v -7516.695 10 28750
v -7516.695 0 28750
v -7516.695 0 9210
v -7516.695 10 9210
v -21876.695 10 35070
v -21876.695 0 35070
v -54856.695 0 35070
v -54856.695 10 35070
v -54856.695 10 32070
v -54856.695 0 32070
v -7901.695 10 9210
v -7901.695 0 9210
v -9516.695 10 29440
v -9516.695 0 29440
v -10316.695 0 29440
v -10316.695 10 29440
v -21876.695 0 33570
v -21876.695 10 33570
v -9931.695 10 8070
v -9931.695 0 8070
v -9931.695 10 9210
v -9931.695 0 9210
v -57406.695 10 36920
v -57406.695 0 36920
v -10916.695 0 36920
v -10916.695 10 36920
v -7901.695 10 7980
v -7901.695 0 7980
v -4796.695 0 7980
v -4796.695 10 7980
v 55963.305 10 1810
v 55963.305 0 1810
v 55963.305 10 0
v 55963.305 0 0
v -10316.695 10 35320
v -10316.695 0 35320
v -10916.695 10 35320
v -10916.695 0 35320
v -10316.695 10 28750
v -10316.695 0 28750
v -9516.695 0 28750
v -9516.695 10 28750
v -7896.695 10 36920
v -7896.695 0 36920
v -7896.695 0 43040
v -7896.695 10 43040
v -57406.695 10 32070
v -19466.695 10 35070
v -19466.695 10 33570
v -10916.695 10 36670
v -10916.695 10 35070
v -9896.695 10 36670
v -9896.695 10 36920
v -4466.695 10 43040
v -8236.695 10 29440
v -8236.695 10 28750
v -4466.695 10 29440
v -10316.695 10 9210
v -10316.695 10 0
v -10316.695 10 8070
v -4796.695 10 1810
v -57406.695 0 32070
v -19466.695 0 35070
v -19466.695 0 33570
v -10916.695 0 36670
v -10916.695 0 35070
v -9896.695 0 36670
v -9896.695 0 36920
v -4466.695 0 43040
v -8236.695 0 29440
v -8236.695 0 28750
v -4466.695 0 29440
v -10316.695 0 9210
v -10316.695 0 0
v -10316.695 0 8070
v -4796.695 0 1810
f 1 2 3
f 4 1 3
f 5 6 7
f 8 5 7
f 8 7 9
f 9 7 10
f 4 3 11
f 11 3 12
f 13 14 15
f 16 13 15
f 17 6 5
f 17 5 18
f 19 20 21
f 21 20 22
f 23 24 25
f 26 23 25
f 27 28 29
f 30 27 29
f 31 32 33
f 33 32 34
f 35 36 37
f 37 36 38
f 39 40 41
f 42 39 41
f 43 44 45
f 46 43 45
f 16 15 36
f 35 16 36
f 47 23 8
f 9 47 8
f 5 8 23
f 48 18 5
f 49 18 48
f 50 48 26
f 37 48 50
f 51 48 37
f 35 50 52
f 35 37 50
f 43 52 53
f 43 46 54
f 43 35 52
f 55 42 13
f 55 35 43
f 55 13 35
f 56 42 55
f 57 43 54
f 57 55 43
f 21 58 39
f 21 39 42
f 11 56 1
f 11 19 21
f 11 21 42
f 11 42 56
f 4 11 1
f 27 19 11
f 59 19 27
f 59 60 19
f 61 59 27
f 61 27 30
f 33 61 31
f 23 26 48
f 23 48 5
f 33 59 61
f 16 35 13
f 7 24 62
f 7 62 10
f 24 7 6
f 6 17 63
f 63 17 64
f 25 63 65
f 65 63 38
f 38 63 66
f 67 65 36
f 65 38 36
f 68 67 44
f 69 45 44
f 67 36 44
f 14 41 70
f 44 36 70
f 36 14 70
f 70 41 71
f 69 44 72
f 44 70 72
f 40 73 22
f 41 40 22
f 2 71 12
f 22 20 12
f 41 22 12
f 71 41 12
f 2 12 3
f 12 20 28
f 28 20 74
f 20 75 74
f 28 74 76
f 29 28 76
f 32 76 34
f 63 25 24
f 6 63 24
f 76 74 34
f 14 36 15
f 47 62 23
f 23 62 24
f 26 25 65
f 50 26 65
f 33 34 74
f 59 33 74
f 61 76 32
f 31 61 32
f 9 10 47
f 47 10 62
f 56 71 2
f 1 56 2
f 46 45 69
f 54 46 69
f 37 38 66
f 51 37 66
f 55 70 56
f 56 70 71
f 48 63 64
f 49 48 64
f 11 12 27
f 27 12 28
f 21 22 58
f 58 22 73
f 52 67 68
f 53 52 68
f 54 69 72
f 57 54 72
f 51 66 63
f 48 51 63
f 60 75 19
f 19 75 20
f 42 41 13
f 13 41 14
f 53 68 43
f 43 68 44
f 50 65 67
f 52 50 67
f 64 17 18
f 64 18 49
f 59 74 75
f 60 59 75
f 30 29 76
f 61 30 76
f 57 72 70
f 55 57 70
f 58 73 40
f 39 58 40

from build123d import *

# Parameters (mm, degrees)
SKETCH_1_W      = 2410
SKETCH_1_H      = 1500
EXTRUDE_1_DEPTH = 10


with BuildPart() as part:
    # 草图1 → 凸台-拉伸1 (new body)
    with BuildSketch(Plane(origin=(0, 0, 0), x_dir=(1, 0, 0), z_dir=(0, 1, 0))):
        with Locations((-20671.695078468, -34320)):
            Rectangle(SKETCH_1_W, SKETCH_1_H)
        Polygon((-7901.695078468, -9210), (-7901.695078468, -8070), (-7901.695078468, -7980), (-4796.695078468, -7980), (-4796.695078468, -1810), (55963.304921532, -1810), (55963.304921532, 0), (0, 0), (-10316.695078468, 0), (-10316.695078468, -8070), (-9931.695078468, -8070), (-9931.695078468, -9210), (-10316.695078468, -9210), (-10316.695078468, -28750), (-9516.695078468, -28750), (-9516.695078468, -29440), (-10316.695078468, -29440), (-10316.695078468, -35320), (-10916.695078468, -35320), (-10916.695078468, -35070), (-54856.695078468, -35070), (-54856.695078468, -32070), (-57406.695078468, -32070), (-57406.695078468, -36920), (-10916.695078468, -36920), (-10916.695078468, -36670), (-9896.695078468, -36670), (-9896.695078468, -36920), (-7896.695078468, -36920), (-7896.695078468, -43040), (-4466.695078468, -43040), (-4466.695078468, -29440), (-8236.695078468, -29440), (-8236.695078468, -28750), (-7516.695078468, -28750), (-7516.695078468, -9210), align=None)
    extrude(amount=EXTRUDE_1_DEPTH)


solid = part.part
